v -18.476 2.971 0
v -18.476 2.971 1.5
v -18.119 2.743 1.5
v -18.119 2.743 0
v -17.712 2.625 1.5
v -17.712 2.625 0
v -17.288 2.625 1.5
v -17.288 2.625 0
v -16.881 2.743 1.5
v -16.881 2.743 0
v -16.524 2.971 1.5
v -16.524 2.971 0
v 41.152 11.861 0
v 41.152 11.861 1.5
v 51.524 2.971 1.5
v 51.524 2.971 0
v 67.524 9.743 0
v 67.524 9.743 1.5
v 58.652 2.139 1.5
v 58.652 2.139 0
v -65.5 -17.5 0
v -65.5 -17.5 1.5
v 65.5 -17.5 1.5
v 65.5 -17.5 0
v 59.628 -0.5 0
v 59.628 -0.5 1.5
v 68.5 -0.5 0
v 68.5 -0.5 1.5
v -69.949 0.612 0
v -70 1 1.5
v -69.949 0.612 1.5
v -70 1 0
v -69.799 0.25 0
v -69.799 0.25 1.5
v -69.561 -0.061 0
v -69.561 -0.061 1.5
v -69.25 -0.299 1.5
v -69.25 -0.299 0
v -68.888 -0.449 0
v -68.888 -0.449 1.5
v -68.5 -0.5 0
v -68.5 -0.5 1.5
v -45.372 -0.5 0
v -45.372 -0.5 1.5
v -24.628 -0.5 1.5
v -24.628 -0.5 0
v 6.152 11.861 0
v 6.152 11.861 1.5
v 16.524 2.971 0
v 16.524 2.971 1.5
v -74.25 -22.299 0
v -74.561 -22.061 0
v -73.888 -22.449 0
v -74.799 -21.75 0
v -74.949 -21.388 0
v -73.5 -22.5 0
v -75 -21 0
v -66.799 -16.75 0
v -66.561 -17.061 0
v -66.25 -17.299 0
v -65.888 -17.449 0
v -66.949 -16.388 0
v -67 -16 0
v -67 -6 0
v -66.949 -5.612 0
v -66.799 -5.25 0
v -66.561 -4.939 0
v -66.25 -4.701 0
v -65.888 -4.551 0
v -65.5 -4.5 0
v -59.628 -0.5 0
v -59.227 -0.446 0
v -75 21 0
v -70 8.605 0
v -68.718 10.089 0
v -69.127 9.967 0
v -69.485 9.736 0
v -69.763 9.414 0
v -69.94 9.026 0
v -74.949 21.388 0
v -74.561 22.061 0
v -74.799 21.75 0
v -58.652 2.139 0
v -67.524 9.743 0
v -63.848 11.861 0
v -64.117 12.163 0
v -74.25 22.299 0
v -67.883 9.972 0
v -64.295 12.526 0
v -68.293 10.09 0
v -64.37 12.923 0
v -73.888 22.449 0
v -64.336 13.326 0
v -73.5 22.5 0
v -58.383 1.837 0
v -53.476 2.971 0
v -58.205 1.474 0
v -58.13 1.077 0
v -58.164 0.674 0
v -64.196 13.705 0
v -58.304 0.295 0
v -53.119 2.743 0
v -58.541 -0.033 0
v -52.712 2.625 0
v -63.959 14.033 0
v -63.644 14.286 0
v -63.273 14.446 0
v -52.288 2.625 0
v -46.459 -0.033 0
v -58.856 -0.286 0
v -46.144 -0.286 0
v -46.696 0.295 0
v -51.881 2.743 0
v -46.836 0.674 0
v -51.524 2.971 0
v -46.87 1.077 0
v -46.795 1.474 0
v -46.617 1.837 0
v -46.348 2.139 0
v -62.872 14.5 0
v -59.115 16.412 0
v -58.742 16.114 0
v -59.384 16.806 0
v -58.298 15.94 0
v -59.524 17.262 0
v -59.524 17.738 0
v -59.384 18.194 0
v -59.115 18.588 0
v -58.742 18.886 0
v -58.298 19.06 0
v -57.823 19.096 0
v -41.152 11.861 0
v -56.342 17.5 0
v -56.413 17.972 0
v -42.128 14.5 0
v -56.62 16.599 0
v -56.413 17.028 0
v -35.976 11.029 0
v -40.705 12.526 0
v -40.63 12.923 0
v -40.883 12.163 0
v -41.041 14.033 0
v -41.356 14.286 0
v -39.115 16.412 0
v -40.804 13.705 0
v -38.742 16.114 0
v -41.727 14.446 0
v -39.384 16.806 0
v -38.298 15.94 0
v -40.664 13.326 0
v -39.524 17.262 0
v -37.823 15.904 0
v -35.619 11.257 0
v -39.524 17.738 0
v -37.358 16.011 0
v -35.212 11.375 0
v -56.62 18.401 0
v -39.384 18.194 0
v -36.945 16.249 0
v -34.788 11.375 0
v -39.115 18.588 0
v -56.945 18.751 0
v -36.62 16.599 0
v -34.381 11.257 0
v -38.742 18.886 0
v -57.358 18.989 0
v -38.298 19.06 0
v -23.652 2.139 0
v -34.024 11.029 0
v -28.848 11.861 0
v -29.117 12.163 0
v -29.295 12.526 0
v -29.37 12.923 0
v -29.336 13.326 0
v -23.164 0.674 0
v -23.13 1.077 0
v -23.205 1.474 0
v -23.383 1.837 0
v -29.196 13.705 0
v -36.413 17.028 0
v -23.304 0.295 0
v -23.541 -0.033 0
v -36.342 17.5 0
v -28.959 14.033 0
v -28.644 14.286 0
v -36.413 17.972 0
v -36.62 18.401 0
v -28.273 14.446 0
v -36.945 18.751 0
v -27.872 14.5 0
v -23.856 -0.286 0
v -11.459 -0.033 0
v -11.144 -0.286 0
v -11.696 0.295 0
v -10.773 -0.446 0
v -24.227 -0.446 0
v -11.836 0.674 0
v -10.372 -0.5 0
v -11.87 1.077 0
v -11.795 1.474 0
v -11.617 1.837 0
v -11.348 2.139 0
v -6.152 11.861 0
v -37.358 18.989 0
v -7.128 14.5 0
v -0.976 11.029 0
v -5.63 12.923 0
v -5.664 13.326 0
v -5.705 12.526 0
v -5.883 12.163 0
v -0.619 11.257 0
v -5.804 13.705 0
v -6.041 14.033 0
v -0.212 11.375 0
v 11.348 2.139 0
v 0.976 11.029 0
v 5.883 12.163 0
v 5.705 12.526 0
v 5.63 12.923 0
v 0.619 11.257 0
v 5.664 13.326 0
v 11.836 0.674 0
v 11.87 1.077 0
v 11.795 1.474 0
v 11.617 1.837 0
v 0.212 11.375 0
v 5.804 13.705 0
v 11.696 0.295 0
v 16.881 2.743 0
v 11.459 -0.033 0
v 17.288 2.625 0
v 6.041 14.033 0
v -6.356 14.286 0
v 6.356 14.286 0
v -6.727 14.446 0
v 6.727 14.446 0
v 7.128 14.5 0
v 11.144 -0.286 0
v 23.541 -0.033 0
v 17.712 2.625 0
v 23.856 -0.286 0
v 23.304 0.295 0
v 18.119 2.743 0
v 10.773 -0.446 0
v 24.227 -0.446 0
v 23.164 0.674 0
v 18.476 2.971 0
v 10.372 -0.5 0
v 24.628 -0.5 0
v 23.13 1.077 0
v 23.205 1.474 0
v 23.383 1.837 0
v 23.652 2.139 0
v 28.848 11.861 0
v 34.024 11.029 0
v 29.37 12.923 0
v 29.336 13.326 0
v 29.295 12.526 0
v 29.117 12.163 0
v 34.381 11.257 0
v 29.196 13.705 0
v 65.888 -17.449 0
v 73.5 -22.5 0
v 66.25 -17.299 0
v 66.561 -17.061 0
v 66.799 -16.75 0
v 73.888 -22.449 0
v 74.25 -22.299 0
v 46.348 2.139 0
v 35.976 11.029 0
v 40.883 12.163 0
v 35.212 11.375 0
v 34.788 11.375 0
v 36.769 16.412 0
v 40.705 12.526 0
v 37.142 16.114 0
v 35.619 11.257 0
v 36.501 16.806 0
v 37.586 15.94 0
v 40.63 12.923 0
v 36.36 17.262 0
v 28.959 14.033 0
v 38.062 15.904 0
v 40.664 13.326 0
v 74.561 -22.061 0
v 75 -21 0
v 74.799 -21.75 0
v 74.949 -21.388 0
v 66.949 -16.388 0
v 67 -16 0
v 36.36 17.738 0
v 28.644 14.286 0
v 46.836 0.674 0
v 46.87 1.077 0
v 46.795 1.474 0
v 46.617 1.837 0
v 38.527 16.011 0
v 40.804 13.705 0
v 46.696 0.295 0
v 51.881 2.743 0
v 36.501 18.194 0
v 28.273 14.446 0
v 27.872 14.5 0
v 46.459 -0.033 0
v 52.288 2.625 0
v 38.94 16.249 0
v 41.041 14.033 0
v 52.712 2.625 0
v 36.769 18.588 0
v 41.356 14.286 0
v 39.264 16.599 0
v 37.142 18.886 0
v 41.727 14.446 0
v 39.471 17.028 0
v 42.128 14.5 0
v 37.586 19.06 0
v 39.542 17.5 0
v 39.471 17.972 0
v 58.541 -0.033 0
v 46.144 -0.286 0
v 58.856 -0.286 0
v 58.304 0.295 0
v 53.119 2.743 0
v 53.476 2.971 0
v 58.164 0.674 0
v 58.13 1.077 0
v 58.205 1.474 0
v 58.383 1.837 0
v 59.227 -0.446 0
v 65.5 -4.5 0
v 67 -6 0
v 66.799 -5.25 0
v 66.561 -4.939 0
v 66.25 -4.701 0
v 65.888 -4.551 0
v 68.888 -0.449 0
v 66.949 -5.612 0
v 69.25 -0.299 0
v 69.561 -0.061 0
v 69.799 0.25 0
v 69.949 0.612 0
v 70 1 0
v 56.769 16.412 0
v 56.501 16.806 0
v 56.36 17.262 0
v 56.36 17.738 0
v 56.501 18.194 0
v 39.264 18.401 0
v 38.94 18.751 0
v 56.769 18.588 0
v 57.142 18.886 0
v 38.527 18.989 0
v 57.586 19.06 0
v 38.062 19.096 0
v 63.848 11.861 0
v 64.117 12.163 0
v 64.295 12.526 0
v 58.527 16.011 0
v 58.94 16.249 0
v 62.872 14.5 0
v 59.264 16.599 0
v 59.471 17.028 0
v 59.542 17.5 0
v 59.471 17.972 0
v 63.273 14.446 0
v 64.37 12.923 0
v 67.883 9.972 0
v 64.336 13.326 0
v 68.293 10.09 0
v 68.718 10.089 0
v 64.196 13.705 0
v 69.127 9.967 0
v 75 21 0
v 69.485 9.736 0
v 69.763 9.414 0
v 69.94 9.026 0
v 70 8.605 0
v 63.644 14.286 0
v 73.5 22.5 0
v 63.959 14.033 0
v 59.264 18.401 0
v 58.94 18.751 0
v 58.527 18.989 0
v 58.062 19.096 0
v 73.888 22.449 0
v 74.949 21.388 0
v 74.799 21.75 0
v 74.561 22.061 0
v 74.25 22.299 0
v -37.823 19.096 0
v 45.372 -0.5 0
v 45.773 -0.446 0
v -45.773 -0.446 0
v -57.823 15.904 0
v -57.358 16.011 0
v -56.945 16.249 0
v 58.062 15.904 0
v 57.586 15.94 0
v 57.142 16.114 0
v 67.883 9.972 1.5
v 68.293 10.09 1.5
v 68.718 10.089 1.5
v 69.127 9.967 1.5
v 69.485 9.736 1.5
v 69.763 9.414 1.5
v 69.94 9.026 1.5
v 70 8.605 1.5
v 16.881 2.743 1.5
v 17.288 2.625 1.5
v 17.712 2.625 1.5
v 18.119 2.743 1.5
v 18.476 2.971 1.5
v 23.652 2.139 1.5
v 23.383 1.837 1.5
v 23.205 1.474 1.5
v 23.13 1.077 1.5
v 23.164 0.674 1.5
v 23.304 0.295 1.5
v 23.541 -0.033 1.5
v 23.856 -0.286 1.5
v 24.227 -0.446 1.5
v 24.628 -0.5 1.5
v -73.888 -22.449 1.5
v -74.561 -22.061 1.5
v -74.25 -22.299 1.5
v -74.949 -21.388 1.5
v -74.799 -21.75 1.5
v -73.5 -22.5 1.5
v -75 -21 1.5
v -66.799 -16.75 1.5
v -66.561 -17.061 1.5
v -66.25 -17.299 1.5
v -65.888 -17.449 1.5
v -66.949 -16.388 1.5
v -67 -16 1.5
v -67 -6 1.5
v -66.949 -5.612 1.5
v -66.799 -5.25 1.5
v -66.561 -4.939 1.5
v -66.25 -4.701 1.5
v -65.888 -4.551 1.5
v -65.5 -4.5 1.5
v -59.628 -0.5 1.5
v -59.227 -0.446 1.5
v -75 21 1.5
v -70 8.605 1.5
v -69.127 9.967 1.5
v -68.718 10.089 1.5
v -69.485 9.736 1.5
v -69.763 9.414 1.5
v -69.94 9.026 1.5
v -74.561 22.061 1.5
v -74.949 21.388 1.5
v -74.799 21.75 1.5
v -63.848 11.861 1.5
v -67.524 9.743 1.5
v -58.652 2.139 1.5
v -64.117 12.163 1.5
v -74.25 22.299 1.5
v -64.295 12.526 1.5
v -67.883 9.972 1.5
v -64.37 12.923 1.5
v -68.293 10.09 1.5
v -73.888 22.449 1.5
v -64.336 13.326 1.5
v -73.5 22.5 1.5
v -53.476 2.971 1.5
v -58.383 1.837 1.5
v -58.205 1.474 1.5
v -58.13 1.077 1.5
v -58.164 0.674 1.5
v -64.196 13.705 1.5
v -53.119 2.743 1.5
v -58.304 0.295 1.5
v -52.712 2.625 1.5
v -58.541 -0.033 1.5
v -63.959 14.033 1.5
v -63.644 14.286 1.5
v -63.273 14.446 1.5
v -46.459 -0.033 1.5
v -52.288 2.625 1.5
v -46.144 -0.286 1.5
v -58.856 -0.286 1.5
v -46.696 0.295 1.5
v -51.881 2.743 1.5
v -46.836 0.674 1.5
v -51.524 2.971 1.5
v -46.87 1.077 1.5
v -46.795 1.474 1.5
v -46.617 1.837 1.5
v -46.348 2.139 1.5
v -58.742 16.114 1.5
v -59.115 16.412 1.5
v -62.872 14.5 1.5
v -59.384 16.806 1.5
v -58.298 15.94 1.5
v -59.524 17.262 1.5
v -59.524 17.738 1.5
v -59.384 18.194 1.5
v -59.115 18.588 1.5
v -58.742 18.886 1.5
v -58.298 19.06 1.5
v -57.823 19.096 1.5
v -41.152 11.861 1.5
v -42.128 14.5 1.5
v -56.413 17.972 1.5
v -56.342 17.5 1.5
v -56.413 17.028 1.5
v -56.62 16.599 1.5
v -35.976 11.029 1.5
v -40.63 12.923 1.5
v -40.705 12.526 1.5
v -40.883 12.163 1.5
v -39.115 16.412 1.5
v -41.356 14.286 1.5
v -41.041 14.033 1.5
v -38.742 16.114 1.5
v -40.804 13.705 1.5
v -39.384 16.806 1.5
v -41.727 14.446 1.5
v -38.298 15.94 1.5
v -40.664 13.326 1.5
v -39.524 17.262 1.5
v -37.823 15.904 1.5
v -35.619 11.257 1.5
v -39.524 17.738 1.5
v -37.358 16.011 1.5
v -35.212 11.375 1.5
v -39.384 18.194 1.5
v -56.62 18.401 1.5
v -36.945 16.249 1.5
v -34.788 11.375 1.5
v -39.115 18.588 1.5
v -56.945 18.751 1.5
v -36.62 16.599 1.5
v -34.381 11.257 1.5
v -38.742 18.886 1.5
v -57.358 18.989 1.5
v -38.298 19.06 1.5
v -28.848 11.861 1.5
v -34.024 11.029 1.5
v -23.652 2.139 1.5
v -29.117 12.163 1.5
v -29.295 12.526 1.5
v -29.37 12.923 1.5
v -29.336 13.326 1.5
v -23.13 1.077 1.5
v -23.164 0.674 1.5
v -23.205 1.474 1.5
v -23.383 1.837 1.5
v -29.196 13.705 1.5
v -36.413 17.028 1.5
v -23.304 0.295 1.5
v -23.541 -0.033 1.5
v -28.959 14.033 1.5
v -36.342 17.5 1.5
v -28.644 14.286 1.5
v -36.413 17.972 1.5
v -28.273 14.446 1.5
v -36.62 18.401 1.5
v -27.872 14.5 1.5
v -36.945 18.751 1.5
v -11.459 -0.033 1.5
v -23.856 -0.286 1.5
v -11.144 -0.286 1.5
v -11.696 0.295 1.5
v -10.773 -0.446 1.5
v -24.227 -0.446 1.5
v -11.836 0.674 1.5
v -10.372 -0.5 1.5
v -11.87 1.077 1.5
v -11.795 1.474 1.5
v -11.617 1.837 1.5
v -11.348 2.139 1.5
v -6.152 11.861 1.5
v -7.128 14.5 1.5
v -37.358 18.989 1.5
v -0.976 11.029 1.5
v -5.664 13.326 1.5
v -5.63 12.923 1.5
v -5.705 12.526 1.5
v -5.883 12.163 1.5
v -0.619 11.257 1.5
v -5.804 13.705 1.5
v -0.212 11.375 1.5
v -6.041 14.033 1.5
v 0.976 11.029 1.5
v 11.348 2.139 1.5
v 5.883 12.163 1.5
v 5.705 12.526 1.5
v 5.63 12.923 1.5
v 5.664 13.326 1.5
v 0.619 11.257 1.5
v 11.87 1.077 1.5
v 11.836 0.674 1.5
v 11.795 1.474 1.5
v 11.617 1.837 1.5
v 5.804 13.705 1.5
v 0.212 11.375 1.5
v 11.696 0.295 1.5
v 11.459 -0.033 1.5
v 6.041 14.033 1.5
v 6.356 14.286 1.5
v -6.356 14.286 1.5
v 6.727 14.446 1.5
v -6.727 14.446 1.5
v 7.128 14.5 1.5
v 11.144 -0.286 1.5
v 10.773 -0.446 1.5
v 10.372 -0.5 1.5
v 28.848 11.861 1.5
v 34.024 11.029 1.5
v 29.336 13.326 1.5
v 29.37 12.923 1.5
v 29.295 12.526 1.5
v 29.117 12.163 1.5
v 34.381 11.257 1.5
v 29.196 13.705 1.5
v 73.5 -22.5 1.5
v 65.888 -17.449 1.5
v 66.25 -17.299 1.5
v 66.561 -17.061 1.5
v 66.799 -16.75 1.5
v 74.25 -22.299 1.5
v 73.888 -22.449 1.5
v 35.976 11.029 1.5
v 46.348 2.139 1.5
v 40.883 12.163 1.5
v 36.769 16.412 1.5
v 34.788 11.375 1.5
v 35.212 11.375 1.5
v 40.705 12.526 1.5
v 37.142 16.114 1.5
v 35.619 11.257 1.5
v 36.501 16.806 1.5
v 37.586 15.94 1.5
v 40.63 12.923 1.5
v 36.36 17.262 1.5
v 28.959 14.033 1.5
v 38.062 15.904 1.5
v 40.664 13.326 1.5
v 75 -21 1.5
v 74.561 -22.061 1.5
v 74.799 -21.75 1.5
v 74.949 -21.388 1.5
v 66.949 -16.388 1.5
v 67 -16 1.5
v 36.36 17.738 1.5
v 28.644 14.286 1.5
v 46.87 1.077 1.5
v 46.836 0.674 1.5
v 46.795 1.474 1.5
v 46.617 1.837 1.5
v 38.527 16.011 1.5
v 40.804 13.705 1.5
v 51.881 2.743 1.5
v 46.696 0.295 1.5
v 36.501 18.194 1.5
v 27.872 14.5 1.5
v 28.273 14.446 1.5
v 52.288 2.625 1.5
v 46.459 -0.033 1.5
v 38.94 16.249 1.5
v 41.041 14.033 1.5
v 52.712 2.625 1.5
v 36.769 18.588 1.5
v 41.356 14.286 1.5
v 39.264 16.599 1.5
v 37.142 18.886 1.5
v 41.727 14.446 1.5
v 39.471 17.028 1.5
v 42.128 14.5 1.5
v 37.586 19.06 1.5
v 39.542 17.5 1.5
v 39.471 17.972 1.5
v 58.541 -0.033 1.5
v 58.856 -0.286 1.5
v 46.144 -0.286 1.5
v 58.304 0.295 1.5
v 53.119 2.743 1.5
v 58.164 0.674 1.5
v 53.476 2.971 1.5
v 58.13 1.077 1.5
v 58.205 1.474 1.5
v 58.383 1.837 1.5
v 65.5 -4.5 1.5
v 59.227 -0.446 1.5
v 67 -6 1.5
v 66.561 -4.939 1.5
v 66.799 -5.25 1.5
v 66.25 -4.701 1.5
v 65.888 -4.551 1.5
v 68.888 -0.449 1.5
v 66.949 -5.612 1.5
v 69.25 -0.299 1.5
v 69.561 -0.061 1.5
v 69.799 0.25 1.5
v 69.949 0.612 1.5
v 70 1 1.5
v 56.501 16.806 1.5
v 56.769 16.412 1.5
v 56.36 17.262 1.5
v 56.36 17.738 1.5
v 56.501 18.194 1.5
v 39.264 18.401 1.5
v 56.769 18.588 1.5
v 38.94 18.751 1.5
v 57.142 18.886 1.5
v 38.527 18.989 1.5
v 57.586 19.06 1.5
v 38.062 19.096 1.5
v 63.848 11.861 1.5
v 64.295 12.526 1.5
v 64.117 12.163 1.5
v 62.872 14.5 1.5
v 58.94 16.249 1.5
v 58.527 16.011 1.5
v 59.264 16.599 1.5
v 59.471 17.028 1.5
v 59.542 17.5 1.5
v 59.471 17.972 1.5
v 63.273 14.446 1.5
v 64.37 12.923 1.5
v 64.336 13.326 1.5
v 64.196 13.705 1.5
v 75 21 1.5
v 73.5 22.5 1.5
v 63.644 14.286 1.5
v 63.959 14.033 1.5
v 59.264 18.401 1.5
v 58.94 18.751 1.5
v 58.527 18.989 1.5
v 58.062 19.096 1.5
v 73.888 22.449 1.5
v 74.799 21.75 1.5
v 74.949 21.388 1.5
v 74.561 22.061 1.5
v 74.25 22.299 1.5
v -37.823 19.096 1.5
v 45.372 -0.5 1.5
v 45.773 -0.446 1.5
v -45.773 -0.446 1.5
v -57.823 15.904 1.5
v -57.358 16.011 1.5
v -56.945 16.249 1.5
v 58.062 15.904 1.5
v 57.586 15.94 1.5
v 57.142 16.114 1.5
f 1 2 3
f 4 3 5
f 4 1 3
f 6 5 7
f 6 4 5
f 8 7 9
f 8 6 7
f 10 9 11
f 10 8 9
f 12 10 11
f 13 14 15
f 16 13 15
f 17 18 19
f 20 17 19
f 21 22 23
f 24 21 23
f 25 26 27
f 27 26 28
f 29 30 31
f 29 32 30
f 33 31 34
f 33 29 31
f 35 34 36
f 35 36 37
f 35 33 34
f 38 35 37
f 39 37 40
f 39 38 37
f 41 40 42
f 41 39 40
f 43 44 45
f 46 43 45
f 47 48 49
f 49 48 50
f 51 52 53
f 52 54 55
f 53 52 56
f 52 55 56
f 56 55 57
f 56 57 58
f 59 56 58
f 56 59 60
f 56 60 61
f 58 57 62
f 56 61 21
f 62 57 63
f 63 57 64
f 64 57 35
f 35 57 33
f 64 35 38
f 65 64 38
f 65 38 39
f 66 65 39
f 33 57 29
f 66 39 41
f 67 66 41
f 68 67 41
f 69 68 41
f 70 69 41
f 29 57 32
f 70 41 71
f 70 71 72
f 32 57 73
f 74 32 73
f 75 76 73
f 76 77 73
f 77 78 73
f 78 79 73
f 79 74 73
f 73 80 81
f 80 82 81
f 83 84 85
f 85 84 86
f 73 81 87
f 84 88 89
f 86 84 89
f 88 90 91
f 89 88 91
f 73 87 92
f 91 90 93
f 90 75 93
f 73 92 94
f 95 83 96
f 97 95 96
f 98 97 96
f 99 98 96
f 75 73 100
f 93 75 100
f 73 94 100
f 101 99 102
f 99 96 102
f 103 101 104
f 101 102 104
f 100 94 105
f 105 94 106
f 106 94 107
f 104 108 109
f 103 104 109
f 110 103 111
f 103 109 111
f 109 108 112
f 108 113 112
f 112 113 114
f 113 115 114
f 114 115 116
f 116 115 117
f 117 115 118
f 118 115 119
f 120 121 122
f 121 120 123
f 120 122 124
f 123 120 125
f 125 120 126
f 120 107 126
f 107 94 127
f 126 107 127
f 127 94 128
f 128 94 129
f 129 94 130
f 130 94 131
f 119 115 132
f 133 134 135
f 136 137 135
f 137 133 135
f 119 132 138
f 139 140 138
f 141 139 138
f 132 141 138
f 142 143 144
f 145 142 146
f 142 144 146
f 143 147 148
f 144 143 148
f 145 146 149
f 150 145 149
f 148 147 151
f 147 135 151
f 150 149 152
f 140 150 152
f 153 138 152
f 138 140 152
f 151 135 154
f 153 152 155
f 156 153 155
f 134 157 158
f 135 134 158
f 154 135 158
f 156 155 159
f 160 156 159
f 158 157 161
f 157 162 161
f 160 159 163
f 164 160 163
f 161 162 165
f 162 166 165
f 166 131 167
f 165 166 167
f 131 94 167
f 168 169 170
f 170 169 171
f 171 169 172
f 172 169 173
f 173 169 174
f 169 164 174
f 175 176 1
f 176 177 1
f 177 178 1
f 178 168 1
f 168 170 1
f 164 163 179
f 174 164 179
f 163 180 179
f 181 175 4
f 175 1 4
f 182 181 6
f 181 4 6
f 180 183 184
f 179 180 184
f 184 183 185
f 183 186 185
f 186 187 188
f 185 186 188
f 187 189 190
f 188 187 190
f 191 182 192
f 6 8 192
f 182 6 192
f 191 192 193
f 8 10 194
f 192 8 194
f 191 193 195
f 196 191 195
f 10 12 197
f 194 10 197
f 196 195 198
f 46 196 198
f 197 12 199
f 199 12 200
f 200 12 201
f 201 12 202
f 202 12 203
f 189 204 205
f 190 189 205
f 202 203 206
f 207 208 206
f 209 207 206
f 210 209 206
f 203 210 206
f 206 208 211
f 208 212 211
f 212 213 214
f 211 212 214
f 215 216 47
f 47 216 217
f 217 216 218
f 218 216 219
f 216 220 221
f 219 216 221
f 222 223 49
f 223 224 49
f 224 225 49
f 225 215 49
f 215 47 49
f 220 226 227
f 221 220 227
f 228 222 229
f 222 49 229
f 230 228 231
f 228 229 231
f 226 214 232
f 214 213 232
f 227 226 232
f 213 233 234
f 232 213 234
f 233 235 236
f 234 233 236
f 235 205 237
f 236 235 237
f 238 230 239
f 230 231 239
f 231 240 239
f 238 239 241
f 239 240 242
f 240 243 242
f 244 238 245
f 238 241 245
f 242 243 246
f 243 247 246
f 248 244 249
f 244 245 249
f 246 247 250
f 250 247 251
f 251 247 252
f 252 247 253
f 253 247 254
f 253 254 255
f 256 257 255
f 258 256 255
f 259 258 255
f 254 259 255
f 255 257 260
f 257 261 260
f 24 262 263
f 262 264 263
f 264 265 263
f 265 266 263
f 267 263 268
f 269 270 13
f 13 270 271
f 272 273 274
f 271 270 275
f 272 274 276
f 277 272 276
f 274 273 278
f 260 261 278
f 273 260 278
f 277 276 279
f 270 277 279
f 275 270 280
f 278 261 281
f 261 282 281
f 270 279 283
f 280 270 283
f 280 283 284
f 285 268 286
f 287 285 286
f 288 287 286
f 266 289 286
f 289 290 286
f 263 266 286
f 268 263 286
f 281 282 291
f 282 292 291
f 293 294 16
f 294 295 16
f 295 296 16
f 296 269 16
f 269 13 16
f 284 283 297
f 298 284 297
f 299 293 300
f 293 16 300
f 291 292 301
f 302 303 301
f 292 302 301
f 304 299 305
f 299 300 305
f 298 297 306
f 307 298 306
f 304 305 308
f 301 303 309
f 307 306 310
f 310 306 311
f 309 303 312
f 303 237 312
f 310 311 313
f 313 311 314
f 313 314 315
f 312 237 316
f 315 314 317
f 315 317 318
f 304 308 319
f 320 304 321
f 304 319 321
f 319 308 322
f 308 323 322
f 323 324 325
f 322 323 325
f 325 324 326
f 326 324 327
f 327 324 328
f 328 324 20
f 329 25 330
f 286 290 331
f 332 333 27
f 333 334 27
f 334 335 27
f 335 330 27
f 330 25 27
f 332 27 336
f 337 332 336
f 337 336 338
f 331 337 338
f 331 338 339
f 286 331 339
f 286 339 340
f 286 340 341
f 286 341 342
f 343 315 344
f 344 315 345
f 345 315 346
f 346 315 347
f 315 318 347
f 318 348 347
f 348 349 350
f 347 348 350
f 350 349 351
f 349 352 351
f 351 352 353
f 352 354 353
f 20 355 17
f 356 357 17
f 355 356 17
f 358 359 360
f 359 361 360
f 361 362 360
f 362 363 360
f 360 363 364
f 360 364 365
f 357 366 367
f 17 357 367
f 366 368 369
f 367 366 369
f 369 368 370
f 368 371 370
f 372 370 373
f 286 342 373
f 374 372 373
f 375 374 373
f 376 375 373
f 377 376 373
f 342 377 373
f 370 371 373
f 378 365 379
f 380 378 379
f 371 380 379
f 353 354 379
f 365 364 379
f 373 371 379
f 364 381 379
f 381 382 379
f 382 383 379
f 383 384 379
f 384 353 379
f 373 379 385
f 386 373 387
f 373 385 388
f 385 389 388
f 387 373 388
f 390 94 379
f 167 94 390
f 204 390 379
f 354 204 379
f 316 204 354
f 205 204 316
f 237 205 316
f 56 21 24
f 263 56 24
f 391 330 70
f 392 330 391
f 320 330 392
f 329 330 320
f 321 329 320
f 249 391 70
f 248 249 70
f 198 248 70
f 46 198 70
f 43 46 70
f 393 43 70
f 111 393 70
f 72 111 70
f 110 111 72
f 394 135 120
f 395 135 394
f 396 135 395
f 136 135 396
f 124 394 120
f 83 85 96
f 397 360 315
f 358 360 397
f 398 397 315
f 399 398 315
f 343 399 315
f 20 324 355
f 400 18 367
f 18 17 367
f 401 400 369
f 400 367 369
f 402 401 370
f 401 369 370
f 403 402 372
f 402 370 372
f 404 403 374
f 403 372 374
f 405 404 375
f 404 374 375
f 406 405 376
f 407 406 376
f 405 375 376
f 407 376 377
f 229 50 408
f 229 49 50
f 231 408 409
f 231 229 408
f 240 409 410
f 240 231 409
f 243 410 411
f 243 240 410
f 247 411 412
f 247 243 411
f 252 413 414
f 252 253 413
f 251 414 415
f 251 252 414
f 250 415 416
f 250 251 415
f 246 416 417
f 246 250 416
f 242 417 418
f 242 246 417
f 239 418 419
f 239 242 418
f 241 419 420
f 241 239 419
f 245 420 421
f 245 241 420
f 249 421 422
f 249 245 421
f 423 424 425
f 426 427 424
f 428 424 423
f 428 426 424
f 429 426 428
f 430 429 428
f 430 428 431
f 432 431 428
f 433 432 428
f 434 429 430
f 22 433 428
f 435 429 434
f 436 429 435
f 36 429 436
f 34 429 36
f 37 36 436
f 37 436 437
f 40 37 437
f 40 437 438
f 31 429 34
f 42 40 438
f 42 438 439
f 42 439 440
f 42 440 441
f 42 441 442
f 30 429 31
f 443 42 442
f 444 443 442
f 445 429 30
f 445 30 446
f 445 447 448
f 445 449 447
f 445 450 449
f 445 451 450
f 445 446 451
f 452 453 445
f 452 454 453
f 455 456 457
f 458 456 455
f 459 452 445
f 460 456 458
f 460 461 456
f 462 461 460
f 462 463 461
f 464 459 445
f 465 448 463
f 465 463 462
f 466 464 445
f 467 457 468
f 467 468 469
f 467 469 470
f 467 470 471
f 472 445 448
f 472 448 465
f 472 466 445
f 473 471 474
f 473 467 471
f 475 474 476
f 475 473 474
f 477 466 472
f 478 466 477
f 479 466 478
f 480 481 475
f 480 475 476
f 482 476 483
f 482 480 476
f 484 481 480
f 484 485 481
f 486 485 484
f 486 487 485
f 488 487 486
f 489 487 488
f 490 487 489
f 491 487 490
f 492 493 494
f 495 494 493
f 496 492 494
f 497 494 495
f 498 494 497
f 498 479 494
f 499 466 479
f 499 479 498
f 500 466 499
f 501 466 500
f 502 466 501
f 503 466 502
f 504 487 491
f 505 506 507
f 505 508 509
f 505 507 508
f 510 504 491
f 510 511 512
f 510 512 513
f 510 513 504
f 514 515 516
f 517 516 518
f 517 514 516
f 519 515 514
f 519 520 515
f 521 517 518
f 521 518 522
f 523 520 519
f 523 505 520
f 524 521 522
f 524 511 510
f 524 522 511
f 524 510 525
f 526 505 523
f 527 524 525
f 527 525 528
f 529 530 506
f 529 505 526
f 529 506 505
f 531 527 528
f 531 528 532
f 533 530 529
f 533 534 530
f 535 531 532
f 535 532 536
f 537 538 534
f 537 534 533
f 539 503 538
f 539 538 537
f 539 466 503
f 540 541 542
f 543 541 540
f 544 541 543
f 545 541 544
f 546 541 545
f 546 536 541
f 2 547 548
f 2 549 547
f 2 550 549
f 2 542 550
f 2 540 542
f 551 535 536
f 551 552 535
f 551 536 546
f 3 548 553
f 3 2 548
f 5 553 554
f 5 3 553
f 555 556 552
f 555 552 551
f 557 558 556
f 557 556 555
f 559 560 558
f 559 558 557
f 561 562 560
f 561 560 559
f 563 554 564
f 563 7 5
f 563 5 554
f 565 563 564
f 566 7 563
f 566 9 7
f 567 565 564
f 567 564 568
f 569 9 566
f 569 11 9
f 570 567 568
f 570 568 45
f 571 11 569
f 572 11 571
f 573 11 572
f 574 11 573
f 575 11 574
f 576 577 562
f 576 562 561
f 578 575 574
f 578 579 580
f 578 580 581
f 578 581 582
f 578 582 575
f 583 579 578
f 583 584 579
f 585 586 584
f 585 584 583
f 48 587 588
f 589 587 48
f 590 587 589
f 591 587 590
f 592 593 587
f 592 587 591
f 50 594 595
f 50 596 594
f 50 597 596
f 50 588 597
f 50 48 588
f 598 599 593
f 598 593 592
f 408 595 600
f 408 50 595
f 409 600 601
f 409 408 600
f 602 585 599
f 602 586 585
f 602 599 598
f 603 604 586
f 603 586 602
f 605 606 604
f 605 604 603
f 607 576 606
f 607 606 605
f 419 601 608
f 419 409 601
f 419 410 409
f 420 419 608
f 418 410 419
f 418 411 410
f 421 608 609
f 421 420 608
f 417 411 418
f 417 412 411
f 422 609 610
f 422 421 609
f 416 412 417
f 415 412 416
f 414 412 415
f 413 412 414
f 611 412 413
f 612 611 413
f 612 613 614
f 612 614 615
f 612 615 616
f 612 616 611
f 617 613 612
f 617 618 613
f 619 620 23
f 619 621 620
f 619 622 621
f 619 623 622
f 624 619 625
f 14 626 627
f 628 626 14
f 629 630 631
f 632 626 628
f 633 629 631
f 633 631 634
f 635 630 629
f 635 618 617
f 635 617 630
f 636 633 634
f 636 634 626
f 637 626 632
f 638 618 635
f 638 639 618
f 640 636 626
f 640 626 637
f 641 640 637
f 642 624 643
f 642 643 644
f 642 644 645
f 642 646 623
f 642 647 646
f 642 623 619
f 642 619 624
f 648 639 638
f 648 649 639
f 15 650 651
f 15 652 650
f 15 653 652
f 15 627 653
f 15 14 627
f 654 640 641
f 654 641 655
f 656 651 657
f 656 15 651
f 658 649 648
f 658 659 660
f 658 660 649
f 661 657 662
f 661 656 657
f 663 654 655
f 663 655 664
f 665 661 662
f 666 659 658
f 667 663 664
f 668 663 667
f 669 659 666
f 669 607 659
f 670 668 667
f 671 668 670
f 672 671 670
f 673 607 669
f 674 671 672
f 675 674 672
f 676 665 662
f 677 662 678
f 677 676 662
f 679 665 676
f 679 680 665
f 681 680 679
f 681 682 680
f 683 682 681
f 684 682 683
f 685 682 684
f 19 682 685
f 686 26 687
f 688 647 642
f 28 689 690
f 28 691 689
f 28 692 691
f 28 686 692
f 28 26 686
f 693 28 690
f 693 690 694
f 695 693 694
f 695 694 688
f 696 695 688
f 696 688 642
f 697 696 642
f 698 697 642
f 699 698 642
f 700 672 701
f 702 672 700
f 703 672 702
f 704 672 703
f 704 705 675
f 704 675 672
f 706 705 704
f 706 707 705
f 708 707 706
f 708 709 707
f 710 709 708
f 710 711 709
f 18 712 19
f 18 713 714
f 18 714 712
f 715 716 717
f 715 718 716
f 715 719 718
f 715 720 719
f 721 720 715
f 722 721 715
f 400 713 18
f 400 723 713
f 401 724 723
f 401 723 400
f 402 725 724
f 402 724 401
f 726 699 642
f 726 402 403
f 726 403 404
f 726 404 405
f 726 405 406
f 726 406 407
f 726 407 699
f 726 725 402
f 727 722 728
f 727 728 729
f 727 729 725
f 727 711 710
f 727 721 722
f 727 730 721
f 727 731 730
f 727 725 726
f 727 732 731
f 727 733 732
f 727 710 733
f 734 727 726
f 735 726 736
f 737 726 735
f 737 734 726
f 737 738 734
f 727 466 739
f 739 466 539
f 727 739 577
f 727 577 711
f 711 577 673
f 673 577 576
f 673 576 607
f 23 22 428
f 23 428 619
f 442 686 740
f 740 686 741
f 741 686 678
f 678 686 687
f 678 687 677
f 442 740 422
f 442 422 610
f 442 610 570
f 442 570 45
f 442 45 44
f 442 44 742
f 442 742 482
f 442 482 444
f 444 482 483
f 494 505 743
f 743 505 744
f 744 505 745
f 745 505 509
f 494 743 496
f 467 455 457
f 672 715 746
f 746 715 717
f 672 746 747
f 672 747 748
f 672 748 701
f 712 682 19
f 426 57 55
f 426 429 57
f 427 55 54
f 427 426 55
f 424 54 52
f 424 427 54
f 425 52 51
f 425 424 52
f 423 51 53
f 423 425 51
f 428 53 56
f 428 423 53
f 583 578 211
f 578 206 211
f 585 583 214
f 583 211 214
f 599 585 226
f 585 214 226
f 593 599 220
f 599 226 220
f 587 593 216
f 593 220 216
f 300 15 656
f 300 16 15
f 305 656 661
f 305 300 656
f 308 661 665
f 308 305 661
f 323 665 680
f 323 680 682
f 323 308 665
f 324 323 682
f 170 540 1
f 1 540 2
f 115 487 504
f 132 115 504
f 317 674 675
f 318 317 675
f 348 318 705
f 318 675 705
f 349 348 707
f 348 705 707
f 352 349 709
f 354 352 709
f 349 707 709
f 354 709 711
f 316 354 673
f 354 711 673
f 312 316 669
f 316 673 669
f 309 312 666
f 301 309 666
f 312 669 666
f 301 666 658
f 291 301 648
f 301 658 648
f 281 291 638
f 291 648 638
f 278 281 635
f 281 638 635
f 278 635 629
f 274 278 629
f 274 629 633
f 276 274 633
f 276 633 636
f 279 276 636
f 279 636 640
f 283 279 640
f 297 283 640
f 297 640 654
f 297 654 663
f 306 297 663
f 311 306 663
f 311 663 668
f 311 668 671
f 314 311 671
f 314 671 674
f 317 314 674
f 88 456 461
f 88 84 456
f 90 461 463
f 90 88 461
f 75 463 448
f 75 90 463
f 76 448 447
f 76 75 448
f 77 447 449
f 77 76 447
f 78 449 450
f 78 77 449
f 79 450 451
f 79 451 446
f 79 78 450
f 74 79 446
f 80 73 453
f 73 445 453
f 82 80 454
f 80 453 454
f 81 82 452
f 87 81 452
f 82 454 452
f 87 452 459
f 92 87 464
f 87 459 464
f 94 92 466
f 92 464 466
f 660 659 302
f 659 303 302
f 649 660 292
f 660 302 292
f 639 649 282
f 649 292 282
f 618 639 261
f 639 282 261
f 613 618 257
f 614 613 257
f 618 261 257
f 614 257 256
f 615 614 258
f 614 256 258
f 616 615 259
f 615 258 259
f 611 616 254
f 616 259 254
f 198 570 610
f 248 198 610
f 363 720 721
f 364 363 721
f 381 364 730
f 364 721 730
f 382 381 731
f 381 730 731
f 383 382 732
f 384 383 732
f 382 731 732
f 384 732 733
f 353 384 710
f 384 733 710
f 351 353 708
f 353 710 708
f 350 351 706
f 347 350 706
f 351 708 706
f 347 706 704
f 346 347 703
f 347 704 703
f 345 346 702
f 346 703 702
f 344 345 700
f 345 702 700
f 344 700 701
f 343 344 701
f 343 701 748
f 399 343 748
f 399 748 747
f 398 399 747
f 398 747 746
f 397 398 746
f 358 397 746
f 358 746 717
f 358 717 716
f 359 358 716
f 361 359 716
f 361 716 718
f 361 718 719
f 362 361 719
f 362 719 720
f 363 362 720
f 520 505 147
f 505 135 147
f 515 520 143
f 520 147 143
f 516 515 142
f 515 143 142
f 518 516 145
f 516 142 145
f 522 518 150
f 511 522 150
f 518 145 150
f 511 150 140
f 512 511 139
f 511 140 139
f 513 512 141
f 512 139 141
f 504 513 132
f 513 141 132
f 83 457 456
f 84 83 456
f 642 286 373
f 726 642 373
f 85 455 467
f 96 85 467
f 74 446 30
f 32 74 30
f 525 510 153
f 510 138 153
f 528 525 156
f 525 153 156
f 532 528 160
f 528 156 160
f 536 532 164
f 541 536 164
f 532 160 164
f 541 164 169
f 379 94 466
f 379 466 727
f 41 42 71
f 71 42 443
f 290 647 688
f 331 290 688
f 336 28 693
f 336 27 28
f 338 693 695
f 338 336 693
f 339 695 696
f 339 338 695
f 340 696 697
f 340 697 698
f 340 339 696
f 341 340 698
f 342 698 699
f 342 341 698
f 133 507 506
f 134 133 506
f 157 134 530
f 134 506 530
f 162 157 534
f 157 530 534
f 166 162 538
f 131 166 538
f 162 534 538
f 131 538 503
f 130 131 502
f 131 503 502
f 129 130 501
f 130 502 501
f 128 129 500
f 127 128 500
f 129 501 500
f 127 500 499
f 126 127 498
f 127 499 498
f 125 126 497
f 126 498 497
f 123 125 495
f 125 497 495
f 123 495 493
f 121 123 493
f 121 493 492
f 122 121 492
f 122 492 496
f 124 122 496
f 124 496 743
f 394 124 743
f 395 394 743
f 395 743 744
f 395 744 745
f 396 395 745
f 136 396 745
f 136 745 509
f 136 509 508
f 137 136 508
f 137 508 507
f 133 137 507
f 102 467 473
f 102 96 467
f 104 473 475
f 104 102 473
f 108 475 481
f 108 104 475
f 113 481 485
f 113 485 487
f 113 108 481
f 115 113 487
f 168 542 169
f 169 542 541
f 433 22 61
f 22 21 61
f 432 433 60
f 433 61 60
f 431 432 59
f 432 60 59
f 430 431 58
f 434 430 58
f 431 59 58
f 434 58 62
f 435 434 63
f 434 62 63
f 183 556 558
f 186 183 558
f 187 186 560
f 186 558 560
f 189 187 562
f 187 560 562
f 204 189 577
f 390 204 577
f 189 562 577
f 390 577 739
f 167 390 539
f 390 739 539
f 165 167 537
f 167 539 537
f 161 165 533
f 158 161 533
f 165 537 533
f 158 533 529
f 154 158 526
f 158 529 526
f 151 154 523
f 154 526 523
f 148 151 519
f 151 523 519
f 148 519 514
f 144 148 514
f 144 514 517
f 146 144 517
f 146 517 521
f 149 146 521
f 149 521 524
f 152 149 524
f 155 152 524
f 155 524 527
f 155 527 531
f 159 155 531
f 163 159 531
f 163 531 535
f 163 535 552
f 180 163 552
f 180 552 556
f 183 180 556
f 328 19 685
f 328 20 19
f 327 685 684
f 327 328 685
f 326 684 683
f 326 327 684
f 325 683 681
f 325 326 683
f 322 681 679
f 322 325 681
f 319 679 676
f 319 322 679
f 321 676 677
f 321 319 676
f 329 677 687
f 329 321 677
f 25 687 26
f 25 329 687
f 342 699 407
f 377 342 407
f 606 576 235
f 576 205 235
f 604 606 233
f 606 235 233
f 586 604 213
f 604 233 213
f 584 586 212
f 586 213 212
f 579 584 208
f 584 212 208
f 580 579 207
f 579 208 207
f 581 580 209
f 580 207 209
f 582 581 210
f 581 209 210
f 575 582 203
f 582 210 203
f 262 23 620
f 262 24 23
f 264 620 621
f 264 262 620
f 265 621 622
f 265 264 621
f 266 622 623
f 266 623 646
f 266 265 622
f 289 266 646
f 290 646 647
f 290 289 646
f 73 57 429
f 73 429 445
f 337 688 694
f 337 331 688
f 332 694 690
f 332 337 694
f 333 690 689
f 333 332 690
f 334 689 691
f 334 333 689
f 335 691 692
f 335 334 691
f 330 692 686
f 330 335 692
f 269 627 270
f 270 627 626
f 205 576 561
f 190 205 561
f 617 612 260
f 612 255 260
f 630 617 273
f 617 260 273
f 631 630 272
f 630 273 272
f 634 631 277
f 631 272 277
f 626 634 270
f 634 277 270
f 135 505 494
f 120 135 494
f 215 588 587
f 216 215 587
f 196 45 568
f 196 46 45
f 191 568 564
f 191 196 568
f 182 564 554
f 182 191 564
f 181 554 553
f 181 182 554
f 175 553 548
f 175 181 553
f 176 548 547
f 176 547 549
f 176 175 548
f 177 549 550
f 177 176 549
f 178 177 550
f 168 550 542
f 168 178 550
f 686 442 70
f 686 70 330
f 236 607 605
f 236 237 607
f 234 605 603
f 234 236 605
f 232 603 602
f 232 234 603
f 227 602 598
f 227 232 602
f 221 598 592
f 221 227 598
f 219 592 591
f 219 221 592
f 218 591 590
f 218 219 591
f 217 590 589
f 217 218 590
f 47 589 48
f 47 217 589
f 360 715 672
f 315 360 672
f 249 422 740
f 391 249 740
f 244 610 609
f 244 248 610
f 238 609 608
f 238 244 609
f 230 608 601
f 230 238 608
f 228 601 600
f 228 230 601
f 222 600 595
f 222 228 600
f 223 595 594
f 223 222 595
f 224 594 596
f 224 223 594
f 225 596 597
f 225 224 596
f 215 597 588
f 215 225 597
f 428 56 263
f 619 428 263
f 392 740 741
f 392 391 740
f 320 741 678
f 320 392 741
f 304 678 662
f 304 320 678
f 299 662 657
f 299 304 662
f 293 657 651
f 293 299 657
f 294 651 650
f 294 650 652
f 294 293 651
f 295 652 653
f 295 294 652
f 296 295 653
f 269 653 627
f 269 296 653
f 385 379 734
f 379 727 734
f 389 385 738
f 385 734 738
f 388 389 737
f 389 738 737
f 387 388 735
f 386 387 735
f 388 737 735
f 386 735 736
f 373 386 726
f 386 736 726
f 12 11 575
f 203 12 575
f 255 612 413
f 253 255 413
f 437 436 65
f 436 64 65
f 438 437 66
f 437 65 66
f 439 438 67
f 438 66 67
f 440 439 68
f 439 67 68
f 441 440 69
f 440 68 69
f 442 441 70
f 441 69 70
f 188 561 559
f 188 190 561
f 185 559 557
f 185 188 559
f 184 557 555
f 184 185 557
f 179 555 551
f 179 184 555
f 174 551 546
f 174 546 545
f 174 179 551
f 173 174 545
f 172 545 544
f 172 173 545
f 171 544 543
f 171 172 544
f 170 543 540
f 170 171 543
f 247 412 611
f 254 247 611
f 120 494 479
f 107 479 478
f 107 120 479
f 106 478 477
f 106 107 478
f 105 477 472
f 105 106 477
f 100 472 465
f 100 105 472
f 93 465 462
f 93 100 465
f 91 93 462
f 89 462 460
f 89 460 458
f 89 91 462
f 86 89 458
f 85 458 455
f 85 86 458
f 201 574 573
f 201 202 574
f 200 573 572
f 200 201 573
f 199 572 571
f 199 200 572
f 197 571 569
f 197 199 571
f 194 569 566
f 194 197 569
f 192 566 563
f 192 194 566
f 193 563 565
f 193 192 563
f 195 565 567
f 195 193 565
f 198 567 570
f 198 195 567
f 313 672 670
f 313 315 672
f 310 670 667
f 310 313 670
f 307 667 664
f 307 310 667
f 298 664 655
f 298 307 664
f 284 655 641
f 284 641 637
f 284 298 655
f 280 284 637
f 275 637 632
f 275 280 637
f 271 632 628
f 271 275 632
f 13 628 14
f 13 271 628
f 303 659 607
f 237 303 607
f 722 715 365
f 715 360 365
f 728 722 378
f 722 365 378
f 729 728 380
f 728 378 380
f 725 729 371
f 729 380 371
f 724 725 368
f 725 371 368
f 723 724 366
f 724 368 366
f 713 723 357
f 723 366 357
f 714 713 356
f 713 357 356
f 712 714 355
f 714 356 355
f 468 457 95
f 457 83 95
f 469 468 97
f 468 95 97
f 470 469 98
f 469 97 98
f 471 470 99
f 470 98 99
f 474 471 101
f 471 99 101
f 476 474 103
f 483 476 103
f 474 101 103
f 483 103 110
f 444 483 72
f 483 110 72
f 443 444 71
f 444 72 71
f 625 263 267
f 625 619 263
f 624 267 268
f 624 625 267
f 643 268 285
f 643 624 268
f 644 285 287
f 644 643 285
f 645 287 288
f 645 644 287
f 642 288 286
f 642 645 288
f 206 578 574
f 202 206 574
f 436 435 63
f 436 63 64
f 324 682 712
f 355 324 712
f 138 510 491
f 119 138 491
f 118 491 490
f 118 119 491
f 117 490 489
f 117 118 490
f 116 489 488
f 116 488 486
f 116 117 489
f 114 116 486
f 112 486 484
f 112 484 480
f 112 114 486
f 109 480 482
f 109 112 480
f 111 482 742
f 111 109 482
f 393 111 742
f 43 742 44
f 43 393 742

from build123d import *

# Parameters (mm, degrees)
SKETCH_1_W          = 150
SKETCH_1_H          = 45
EXTRUDE_1_DEPTH     = 1.5
SKETCH_2_R          = 1.6
SKETCH_2_W          = 134
SKETCH_2_H          = 13
CUT_EXTRUDE_1_DEPTH = 79.316664893
CUT_EXTRUDE_2_DEPTH = 79.316664893
FILLET_1_R          = 1.5


with BuildPart() as part:
    # 草图1 → 凸台-拉伸1 (new body)
    with BuildSketch(Plane.XY):
        Rectangle(SKETCH_1_W, SKETCH_1_H)
    extrude(amount=EXTRUDE_1_DEPTH)

    # 草图2 → 切除-拉伸1 (cut, through all)
    with BuildSketch(Plane.XY.offset(1.5)):
        with Locations((37.942286341, 17.5)):
            Circle(SKETCH_2_R)
        with Locations((57.942286341, 17.5)):
            Circle(SKETCH_2_R)
        with Locations((-37.942286341, 17.5)):
            Circle(SKETCH_2_R)
        with Locations((-57.942286341, 17.5)):
            Circle(SKETCH_2_R)
        with Locations((0, -11)):
            Rectangle(SKETCH_2_W, SKETCH_2_H)
    extrude(amount=-CUT_EXTRUDE_1_DEPTH, mode=Mode.SUBTRACT)

    # 草图3 → 切除-拉伸2 (cut, through all)
    with BuildSketch(Plane.XY.offset(1.5)):
        Polygon((-55.573181486, -0.5), (-70, 11.865844441), (-70, -0.5), align=None)
        Polygon((-38.073181486, 14.5), (-66.926818514, 14.5), (-52.5, 2.134155559), align=None)
        Polygon((-35, 11.865844441), (-49.426818514, -0.5), (-20.573181486, -0.5), align=None)
        Polygon((-3.073181486, 14.5), (-31.926818514, 14.5), (-17.5, 2.134155559), align=None)
        Polygon((0, 11.865844441), (-14.426818514, -0.5), (14.426818514, -0.5), align=None)
        Polygon((31.926818514, 14.5), (3.073181486, 14.5), (17.5, 2.134155559), align=None)
        Polygon((35, 11.865844441), (20.573181486, -0.5), (49.426818514, -0.5), align=None)
        Polygon((66.926818514, 14.5), (38.073181486, 14.5), (52.5, 2.134155559), align=None)
        Polygon((70, 11.865844441), (55.573181486, -0.5), (70, -0.5), align=None)
    extrude(amount=-CUT_EXTRUDE_2_DEPTH, mode=Mode.SUBTRACT)

    # 圆角1
    fillet_1_edges = [part.edges().sort_by_distance(p)[0] for p in [
        (17.5, 2.134155559, 0.75),
        (3.073181486, 14.5, 0.75),
        (31.926818514, 14.5, 0.75),
        (35, 11.865844441, 0.75),
        (49.426818514, -0.5, 0.75),
        (20.573181486, -0.5, 0.75),
        (-70, 11.865844441, 0.75),
        (-55.573181486, -0.5, 0.75),
        (-70, -0.5, 0.75),
        (67, -4.5, 0.75),
        (67, -17.5, 0.75),
        (-67, -17.5, 0.75),
        (-67, -4.5, 0.75),
        (-17.5, 2.134155559, 0.75),
        (-31.926818514, 14.5, 0.75),
        (-3.073181486, 14.5, 0.75),
        (75, -22.5, 0.75),
        (-75, -22.5, 0.75),
        (0, 11.865844441, 0.75),
        (14.426818514, -0.5, 0.75),
        (-75, 22.5, 0.75),
        (-14.426818514, -0.5, 0.75),
        (75, 22.5, 0.75),
        (-52.5, 2.134155559, 0.75),
        (-66.926818514, 14.5, 0.75),
        (-38.073181486, 14.5, 0.75),
        (-35, 11.865844441, 0.75),
        (-20.573181486, -0.5, 0.75),
        (-49.426818514, -0.5, 0.75),
        (52.5, 2.134155559, 0.75),
        (38.073181486, 14.5, 0.75),
        (66.926818514, 14.5, 0.75),
        (55.573181486, -0.5, 0.75),
        (70, 11.865844441, 0.75),
        (70, -0.5, 0.75),
    ]]
    fillet(fillet_1_edges, radius=FILLET_1_R)


solid = part.part
